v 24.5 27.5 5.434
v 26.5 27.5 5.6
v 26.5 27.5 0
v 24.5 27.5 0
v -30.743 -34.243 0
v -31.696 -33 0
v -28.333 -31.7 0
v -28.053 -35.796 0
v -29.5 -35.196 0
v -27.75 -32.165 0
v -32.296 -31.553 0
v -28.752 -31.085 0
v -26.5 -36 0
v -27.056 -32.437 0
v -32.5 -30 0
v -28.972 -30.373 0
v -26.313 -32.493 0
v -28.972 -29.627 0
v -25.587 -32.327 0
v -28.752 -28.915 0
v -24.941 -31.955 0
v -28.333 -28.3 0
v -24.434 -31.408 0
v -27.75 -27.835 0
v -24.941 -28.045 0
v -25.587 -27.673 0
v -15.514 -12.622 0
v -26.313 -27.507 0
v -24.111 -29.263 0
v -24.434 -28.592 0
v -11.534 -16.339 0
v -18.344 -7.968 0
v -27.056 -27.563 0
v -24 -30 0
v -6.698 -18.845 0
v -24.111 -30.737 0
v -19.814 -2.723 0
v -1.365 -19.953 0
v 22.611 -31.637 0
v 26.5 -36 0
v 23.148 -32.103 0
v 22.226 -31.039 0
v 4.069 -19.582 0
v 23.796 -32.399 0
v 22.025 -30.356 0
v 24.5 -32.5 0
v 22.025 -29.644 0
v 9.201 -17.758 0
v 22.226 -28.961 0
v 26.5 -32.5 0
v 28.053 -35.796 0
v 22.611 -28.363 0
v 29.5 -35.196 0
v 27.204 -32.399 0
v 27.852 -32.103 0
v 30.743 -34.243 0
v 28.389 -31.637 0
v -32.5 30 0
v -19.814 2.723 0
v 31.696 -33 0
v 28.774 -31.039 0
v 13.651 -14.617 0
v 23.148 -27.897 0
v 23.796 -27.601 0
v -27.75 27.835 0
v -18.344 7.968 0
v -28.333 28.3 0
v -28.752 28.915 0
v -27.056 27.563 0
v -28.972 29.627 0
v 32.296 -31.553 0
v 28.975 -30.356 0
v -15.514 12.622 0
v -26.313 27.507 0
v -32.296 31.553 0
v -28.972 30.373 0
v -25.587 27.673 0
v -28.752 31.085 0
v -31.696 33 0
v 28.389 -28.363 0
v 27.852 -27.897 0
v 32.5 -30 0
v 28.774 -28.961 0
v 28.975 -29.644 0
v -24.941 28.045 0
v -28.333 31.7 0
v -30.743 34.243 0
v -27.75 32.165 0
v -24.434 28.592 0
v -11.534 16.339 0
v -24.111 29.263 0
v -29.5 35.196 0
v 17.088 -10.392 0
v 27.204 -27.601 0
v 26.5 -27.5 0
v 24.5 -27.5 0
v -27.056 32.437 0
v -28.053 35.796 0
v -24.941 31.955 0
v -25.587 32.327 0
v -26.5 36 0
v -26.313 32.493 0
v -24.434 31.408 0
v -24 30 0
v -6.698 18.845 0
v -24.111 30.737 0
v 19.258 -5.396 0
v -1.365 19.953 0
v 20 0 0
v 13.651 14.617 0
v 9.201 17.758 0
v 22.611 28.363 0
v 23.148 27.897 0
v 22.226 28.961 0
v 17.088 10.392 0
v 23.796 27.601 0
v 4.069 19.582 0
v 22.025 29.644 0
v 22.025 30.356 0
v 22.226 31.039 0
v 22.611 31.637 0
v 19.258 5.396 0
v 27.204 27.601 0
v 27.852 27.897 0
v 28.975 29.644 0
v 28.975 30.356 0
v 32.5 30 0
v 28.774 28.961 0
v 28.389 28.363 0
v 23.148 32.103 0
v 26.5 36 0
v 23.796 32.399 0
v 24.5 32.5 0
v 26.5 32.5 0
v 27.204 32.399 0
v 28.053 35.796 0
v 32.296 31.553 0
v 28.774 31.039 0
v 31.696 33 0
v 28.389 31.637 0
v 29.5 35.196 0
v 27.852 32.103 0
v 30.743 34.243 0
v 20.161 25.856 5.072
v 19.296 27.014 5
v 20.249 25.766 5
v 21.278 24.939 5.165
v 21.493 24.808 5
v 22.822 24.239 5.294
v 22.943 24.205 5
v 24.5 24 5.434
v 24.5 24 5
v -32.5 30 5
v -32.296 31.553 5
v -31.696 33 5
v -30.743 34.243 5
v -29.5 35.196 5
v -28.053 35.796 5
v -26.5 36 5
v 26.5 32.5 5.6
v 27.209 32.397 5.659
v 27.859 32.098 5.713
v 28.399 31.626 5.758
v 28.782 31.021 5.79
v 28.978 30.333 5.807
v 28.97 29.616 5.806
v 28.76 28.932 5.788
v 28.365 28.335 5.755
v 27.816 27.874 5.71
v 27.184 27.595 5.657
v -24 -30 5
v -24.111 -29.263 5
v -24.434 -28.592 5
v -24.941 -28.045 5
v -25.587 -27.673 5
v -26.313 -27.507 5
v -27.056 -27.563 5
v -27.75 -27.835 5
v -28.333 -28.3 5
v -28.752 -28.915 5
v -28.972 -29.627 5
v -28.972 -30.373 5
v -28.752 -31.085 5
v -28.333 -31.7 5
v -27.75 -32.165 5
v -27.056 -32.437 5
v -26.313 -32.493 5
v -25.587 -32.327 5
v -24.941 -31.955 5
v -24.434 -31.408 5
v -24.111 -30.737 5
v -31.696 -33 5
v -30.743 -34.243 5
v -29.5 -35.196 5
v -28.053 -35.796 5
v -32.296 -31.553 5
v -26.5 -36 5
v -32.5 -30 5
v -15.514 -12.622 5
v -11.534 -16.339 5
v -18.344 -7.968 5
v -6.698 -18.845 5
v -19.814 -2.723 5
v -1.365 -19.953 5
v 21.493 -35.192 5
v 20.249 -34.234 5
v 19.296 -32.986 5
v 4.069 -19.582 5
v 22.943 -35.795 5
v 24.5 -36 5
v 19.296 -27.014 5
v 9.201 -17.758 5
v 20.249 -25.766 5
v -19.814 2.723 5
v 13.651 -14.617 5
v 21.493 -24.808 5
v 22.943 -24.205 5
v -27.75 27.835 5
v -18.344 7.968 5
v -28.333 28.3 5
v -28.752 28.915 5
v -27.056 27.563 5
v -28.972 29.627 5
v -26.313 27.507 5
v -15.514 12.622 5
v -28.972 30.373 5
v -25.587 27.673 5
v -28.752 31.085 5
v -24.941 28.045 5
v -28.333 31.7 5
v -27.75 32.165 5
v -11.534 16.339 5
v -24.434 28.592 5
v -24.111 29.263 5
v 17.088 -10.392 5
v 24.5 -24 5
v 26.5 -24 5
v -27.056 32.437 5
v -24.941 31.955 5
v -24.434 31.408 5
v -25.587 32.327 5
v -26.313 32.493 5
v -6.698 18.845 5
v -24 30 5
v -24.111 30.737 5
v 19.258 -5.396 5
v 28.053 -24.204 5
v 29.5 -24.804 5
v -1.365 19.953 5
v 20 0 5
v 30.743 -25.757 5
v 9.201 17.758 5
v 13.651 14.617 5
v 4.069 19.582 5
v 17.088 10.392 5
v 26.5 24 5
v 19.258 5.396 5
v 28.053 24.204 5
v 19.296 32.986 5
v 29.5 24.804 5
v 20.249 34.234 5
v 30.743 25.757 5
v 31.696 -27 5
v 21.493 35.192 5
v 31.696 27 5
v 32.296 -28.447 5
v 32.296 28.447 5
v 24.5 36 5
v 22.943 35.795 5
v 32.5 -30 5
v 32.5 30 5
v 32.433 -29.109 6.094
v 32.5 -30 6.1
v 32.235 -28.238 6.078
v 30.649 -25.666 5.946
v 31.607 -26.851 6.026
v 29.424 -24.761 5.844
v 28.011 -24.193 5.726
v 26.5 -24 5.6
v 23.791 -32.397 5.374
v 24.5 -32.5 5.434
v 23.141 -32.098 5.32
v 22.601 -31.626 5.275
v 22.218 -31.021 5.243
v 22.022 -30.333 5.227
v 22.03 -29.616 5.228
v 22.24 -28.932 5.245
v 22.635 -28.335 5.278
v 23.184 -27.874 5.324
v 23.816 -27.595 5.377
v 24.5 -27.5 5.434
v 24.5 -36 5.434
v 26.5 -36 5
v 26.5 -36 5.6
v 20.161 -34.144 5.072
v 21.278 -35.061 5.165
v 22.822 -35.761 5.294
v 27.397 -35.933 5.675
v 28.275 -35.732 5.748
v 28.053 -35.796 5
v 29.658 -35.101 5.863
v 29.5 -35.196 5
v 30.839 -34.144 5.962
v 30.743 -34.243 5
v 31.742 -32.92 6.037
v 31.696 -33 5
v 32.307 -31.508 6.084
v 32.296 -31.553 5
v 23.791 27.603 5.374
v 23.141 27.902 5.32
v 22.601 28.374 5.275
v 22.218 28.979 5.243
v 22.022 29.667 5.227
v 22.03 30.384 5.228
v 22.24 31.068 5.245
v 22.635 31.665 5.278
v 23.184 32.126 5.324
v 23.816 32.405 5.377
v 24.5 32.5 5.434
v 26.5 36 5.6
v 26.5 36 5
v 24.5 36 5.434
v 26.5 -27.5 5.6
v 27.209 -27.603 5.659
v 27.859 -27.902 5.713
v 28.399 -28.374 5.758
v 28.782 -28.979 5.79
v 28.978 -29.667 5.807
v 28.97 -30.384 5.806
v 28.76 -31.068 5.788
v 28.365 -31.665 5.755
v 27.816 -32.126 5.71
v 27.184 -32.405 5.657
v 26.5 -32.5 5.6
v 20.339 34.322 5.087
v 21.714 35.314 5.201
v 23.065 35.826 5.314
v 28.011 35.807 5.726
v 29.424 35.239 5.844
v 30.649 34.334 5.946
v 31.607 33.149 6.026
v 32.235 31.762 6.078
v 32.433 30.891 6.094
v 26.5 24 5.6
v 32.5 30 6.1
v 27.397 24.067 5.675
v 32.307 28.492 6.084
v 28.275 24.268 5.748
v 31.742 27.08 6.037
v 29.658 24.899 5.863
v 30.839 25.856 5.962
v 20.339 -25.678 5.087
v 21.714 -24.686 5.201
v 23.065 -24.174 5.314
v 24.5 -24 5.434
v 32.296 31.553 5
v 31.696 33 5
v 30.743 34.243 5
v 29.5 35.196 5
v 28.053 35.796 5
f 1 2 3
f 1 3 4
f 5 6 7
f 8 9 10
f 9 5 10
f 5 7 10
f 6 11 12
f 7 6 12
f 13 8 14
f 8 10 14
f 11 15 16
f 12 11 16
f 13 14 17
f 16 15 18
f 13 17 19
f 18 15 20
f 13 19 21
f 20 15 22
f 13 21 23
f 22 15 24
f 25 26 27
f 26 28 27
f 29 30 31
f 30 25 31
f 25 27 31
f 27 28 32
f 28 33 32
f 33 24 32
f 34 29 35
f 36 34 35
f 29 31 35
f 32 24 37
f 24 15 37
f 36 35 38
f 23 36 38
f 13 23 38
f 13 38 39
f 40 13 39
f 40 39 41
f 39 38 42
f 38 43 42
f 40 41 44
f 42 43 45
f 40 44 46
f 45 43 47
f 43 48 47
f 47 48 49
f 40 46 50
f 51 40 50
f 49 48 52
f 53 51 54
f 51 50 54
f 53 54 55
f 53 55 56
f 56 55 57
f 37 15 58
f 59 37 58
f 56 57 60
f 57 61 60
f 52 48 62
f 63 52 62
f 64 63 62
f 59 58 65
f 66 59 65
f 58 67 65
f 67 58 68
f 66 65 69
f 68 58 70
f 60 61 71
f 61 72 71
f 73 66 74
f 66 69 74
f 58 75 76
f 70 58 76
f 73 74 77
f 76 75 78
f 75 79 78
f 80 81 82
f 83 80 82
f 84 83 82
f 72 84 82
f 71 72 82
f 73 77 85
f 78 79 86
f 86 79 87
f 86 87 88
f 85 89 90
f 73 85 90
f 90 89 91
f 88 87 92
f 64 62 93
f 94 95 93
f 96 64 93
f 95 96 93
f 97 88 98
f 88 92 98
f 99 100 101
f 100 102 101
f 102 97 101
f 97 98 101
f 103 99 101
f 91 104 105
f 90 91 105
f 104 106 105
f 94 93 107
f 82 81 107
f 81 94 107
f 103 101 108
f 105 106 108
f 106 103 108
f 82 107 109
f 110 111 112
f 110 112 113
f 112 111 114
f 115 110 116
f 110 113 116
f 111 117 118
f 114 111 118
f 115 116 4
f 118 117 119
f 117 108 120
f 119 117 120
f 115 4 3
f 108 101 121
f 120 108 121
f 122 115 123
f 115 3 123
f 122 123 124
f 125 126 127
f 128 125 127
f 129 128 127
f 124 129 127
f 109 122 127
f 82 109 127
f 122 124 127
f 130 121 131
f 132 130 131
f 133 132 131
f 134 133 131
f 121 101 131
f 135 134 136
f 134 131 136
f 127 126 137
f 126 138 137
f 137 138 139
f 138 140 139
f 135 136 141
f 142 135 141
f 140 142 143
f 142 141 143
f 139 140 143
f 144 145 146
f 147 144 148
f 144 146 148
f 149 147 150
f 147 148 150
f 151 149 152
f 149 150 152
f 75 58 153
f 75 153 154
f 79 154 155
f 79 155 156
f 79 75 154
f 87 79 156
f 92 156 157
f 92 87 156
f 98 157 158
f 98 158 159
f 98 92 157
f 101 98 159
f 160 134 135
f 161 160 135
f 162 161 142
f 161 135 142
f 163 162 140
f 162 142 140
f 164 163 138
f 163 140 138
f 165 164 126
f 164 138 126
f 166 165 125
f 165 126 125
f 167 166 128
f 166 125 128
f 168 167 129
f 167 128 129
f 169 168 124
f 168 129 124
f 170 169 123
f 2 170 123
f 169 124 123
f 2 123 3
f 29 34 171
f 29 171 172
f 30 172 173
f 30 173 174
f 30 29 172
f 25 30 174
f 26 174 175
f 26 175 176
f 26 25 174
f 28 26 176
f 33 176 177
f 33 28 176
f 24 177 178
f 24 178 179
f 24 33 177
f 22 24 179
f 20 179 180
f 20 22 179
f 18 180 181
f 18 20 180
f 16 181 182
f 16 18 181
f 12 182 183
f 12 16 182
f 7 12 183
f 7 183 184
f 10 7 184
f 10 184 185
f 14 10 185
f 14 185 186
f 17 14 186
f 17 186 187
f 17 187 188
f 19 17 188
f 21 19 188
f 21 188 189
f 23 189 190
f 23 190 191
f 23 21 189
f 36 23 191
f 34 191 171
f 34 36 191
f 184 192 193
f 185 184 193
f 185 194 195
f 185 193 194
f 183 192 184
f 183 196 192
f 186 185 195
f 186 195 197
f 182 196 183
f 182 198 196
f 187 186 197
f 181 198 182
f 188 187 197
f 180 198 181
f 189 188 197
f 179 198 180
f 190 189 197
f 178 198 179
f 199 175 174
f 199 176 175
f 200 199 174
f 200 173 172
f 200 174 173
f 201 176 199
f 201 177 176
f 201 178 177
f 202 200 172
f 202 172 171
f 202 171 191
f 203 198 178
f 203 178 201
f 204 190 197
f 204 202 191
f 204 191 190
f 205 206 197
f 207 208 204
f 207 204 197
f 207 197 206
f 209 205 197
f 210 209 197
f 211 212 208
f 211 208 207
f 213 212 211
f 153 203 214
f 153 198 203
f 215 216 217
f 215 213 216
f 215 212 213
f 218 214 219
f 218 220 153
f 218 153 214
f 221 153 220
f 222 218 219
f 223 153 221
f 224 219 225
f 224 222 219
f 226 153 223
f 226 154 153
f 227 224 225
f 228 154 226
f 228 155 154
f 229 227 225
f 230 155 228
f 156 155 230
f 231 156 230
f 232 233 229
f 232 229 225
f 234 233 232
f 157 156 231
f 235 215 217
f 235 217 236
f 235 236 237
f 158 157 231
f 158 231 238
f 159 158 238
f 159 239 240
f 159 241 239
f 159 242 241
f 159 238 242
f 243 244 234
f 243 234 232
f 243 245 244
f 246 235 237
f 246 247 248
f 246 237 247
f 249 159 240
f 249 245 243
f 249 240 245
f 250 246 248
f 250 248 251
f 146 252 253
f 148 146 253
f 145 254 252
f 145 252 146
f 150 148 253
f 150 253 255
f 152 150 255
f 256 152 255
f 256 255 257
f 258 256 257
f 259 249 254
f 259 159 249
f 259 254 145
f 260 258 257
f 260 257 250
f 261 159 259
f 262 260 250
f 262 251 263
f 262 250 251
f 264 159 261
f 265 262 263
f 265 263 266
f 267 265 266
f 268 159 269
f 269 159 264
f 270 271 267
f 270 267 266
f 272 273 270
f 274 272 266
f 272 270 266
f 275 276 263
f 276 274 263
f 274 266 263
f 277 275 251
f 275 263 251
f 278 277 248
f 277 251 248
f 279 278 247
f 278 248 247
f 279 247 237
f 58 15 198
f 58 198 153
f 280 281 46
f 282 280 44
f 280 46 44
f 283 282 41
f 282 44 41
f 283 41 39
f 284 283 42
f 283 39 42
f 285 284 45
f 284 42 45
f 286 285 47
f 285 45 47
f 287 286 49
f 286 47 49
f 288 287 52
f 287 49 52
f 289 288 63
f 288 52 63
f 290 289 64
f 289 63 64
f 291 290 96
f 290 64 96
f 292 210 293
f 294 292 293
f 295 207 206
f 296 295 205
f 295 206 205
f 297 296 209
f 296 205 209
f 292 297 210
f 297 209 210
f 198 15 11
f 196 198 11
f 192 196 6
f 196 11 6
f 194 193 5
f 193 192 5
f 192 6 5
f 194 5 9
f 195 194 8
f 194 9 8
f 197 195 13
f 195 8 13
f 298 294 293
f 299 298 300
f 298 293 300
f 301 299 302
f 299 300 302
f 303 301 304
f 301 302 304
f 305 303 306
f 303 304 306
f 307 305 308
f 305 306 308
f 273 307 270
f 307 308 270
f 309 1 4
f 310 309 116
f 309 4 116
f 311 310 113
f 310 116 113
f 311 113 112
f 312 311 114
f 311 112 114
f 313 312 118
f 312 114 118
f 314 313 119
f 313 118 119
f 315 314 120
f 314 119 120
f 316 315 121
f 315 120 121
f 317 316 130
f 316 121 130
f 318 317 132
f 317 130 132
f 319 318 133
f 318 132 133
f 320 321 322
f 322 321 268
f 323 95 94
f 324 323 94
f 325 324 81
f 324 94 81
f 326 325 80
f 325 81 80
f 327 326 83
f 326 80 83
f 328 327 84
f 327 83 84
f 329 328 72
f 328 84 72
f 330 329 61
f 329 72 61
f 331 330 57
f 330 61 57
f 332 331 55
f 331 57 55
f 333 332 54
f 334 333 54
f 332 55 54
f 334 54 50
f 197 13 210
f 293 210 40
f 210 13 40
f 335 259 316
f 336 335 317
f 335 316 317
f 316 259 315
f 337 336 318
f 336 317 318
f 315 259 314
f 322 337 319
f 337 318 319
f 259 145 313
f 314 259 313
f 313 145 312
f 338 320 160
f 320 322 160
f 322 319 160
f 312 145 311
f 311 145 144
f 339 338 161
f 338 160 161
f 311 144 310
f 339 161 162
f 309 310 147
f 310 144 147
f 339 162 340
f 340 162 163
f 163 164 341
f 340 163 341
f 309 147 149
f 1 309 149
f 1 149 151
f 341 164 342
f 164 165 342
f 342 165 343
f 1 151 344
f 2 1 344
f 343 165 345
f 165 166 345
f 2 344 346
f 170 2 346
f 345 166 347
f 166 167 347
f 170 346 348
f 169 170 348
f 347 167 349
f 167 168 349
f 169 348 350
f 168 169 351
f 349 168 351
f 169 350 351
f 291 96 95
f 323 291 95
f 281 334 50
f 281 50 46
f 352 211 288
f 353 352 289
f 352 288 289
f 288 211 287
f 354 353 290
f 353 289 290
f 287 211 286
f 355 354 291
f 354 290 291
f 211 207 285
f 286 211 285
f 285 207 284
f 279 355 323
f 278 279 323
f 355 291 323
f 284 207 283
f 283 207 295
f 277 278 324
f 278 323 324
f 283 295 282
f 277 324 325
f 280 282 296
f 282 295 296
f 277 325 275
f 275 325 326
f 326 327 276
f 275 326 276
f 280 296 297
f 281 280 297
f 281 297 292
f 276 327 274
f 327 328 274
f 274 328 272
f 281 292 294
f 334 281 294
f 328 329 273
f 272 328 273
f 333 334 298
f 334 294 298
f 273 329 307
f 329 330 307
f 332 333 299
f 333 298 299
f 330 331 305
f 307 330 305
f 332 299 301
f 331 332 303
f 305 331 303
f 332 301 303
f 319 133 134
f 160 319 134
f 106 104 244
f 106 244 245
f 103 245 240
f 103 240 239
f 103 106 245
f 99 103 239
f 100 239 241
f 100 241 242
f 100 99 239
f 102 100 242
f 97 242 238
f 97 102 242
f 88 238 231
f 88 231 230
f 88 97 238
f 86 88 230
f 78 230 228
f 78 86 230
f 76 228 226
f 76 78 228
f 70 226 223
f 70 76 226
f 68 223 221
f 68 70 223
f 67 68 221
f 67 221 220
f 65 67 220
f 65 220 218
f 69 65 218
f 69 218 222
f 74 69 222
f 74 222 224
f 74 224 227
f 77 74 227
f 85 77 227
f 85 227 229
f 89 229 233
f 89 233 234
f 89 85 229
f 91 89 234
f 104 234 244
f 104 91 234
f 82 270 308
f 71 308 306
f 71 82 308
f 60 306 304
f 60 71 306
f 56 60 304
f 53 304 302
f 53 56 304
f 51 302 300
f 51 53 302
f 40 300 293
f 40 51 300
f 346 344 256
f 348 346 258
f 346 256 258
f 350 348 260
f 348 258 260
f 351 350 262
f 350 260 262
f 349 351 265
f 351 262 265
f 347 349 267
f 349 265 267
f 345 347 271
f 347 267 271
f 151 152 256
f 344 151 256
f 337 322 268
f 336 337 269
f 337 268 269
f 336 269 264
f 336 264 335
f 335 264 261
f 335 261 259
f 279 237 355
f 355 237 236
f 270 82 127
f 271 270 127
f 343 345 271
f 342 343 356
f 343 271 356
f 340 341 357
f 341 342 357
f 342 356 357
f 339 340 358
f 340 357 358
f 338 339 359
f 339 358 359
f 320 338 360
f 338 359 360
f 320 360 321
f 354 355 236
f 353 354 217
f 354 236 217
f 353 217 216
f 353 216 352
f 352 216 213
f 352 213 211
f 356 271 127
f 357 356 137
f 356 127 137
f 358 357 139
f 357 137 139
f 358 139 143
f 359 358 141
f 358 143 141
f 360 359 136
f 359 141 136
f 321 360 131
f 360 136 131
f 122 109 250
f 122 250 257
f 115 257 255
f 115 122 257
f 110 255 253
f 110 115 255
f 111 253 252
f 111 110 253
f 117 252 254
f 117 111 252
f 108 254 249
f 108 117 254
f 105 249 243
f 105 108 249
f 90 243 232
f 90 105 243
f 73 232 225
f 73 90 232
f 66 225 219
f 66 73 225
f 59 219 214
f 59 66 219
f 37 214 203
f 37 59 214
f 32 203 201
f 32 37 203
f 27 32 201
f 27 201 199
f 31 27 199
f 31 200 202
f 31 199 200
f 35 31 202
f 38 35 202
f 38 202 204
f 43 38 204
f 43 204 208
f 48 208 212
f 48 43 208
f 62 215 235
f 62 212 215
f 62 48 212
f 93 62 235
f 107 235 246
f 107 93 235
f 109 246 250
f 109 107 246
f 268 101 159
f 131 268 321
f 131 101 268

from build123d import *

# Parameters (mm, degrees)
F0_W        = 65
F0_H        = 72
F0_R        = 2.5
F0_R_2      = 20
F1_DEPTH    = 5
F3_DEPTH    = 1.1
F5_DEPTH    = 72.001
F6_T1_DEPTH = 35


# Not quite as in the source:
# - a fillet or chamfer that OpenCascade refuses, or shapes differently, is made with other operations: its cross-section is extruded or revolved along the edge and cut away or added


with BuildPart() as f1:
    # F0 (on Top) → F1 (new body)
    with BuildSketch(Plane.XY):
        Rectangle(F0_W, F0_H)
        with Locations((-26.5, -30)):
            Circle(F0_R, mode=Mode.SUBTRACT)
        with BuildLine():
            Line((26.5, -32.5), (24.5, -32.5))
            ThreePointArc((24.5, -32.5), (22, -30), (24.5, -27.5))
            Line((24.5, -27.5), (26.5, -27.5))
            ThreePointArc((26.5, -27.5), (29, -30), (26.5, -32.5))
        make_face(mode=Mode.SUBTRACT)
        with Locations((-26.5, 30)):
            Circle(F0_R, mode=Mode.SUBTRACT)
        Circle(F0_R_2, mode=Mode.SUBTRACT)
        with BuildLine():
            Line((26.5, 27.5), (24.5, 27.5))
            ThreePointArc((24.5, 27.5), (22, 30), (24.5, 32.5))
            Line((24.5, 32.5), (26.5, 32.5))
            ThreePointArc((26.5, 32.5), (29, 30), (26.5, 27.5))
        make_face(mode=Mode.SUBTRACT)
    extrude(amount=F1_DEPTH)

    # F2 (on face) → F3 (join)
    with BuildSketch(Plane.XY.offset(5)):
        with BuildLine():
            Line((26.5, -24.0000002086), (24.5, -24.0000002086))
            ThreePointArc((24.5, -24.0000002086), (18.5000002086, -30), (24.5, -35.9999997914))
            Line((24.5, -35.9999997914), (26.5, -35.9999997914))
            ThreePointArc((26.5, -35.9999997914), (30.7426405396, -34.2426405396), (32.4999997914, -30))
            ThreePointArc((32.4999997914, -30), (30.7426405396, -25.7573594604), (26.5, -24.0000002086))
        make_face()
        with BuildLine():
            ThreePointArc((26.5, -27.5), (29, -30), (26.5, -32.5))
            Line((26.5, -32.5), (24.5, -32.5))
            ThreePointArc((24.5, -32.5), (22, -30), (24.5, -27.5))
            Line((24.5, -27.5), (26.5, -27.5))
        make_face(mode=Mode.SUBTRACT)
        with BuildLine():
            ThreePointArc((26.5, 24.0000002086), (30.7426405396, 25.7573594604), (32.4999997914, 30))
            ThreePointArc((32.4999997914, 30), (30.7426405396, 34.2426405396), (26.5, 35.9999997914))
            Line((26.5, 35.9999997914), (24.5, 35.9999997914))
            ThreePointArc((24.5, 35.9999997914), (18.5000002086, 30), (24.5, 24.0000002086))
            Line((24.5, 24.0000002086), (26.5, 24.0000002086))
        make_face()
        with BuildLine():
            ThreePointArc((26.5, 32.5), (29, 30), (26.5, 27.5))
            Line((26.5, 27.5), (24.5, 27.5))
            ThreePointArc((24.5, 27.5), (22, 30), (24.5, 32.5))
            Line((24.5, 32.5), (26.5, 32.5))
        make_face(mode=Mode.SUBTRACT)
    extrude(amount=F3_DEPTH)

    # F4 (on face) → F5 (cut, through all)
    with BuildSketch(Plane.XZ.offset(36)):
        Polygon((19.295739324, 5), (32.5, 6.1), (18.5000002086, 6.1), (18.5000002086, 5), align=None)
    extrude(amount=-F5_DEPTH, mode=Mode.SUBTRACT)

    # F6: fillet of radius 6 on 4 edges, made by hand

    # F6_s2 → F6_t1 (cut)
    with BuildSketch(Plane.XY.offset(-15)):
        with BuildLine():
            ThreePointArc((-32.5, -30), (-30.7426406871, -34.2426406871), (-26.5, -36))
            Line((-26.5, -36), (-32.5, -36))
            Line((-32.5, -36), (-32.5, -30))
        make_face()
        with BuildLine():
            ThreePointArc((-32.5, 30), (-30.7426406871, 34.2426406871), (-26.5, 36))
            Line((-26.5, 36), (-32.5, 36))
            Line((-32.5, 36), (-32.5, 30))
        make_face()
        with BuildLine():
            ThreePointArc((32.5, 30), (30.7426406871, 34.2426406871), (26.5, 36))
            Line((26.5, 36), (32.5, 36))
            Line((32.5, 36), (32.5, 30))
        make_face()
        with BuildLine():
            ThreePointArc((32.5, -30), (30.7426406871, -34.2426406871), (26.5, -36))
            Line((26.5, -36), (32.5, -36))
            Line((32.5, -36), (32.5, -30))
        make_face()
    extrude(amount=F6_T1_DEPTH, mode=Mode.SUBTRACT)


solid = f1.part
